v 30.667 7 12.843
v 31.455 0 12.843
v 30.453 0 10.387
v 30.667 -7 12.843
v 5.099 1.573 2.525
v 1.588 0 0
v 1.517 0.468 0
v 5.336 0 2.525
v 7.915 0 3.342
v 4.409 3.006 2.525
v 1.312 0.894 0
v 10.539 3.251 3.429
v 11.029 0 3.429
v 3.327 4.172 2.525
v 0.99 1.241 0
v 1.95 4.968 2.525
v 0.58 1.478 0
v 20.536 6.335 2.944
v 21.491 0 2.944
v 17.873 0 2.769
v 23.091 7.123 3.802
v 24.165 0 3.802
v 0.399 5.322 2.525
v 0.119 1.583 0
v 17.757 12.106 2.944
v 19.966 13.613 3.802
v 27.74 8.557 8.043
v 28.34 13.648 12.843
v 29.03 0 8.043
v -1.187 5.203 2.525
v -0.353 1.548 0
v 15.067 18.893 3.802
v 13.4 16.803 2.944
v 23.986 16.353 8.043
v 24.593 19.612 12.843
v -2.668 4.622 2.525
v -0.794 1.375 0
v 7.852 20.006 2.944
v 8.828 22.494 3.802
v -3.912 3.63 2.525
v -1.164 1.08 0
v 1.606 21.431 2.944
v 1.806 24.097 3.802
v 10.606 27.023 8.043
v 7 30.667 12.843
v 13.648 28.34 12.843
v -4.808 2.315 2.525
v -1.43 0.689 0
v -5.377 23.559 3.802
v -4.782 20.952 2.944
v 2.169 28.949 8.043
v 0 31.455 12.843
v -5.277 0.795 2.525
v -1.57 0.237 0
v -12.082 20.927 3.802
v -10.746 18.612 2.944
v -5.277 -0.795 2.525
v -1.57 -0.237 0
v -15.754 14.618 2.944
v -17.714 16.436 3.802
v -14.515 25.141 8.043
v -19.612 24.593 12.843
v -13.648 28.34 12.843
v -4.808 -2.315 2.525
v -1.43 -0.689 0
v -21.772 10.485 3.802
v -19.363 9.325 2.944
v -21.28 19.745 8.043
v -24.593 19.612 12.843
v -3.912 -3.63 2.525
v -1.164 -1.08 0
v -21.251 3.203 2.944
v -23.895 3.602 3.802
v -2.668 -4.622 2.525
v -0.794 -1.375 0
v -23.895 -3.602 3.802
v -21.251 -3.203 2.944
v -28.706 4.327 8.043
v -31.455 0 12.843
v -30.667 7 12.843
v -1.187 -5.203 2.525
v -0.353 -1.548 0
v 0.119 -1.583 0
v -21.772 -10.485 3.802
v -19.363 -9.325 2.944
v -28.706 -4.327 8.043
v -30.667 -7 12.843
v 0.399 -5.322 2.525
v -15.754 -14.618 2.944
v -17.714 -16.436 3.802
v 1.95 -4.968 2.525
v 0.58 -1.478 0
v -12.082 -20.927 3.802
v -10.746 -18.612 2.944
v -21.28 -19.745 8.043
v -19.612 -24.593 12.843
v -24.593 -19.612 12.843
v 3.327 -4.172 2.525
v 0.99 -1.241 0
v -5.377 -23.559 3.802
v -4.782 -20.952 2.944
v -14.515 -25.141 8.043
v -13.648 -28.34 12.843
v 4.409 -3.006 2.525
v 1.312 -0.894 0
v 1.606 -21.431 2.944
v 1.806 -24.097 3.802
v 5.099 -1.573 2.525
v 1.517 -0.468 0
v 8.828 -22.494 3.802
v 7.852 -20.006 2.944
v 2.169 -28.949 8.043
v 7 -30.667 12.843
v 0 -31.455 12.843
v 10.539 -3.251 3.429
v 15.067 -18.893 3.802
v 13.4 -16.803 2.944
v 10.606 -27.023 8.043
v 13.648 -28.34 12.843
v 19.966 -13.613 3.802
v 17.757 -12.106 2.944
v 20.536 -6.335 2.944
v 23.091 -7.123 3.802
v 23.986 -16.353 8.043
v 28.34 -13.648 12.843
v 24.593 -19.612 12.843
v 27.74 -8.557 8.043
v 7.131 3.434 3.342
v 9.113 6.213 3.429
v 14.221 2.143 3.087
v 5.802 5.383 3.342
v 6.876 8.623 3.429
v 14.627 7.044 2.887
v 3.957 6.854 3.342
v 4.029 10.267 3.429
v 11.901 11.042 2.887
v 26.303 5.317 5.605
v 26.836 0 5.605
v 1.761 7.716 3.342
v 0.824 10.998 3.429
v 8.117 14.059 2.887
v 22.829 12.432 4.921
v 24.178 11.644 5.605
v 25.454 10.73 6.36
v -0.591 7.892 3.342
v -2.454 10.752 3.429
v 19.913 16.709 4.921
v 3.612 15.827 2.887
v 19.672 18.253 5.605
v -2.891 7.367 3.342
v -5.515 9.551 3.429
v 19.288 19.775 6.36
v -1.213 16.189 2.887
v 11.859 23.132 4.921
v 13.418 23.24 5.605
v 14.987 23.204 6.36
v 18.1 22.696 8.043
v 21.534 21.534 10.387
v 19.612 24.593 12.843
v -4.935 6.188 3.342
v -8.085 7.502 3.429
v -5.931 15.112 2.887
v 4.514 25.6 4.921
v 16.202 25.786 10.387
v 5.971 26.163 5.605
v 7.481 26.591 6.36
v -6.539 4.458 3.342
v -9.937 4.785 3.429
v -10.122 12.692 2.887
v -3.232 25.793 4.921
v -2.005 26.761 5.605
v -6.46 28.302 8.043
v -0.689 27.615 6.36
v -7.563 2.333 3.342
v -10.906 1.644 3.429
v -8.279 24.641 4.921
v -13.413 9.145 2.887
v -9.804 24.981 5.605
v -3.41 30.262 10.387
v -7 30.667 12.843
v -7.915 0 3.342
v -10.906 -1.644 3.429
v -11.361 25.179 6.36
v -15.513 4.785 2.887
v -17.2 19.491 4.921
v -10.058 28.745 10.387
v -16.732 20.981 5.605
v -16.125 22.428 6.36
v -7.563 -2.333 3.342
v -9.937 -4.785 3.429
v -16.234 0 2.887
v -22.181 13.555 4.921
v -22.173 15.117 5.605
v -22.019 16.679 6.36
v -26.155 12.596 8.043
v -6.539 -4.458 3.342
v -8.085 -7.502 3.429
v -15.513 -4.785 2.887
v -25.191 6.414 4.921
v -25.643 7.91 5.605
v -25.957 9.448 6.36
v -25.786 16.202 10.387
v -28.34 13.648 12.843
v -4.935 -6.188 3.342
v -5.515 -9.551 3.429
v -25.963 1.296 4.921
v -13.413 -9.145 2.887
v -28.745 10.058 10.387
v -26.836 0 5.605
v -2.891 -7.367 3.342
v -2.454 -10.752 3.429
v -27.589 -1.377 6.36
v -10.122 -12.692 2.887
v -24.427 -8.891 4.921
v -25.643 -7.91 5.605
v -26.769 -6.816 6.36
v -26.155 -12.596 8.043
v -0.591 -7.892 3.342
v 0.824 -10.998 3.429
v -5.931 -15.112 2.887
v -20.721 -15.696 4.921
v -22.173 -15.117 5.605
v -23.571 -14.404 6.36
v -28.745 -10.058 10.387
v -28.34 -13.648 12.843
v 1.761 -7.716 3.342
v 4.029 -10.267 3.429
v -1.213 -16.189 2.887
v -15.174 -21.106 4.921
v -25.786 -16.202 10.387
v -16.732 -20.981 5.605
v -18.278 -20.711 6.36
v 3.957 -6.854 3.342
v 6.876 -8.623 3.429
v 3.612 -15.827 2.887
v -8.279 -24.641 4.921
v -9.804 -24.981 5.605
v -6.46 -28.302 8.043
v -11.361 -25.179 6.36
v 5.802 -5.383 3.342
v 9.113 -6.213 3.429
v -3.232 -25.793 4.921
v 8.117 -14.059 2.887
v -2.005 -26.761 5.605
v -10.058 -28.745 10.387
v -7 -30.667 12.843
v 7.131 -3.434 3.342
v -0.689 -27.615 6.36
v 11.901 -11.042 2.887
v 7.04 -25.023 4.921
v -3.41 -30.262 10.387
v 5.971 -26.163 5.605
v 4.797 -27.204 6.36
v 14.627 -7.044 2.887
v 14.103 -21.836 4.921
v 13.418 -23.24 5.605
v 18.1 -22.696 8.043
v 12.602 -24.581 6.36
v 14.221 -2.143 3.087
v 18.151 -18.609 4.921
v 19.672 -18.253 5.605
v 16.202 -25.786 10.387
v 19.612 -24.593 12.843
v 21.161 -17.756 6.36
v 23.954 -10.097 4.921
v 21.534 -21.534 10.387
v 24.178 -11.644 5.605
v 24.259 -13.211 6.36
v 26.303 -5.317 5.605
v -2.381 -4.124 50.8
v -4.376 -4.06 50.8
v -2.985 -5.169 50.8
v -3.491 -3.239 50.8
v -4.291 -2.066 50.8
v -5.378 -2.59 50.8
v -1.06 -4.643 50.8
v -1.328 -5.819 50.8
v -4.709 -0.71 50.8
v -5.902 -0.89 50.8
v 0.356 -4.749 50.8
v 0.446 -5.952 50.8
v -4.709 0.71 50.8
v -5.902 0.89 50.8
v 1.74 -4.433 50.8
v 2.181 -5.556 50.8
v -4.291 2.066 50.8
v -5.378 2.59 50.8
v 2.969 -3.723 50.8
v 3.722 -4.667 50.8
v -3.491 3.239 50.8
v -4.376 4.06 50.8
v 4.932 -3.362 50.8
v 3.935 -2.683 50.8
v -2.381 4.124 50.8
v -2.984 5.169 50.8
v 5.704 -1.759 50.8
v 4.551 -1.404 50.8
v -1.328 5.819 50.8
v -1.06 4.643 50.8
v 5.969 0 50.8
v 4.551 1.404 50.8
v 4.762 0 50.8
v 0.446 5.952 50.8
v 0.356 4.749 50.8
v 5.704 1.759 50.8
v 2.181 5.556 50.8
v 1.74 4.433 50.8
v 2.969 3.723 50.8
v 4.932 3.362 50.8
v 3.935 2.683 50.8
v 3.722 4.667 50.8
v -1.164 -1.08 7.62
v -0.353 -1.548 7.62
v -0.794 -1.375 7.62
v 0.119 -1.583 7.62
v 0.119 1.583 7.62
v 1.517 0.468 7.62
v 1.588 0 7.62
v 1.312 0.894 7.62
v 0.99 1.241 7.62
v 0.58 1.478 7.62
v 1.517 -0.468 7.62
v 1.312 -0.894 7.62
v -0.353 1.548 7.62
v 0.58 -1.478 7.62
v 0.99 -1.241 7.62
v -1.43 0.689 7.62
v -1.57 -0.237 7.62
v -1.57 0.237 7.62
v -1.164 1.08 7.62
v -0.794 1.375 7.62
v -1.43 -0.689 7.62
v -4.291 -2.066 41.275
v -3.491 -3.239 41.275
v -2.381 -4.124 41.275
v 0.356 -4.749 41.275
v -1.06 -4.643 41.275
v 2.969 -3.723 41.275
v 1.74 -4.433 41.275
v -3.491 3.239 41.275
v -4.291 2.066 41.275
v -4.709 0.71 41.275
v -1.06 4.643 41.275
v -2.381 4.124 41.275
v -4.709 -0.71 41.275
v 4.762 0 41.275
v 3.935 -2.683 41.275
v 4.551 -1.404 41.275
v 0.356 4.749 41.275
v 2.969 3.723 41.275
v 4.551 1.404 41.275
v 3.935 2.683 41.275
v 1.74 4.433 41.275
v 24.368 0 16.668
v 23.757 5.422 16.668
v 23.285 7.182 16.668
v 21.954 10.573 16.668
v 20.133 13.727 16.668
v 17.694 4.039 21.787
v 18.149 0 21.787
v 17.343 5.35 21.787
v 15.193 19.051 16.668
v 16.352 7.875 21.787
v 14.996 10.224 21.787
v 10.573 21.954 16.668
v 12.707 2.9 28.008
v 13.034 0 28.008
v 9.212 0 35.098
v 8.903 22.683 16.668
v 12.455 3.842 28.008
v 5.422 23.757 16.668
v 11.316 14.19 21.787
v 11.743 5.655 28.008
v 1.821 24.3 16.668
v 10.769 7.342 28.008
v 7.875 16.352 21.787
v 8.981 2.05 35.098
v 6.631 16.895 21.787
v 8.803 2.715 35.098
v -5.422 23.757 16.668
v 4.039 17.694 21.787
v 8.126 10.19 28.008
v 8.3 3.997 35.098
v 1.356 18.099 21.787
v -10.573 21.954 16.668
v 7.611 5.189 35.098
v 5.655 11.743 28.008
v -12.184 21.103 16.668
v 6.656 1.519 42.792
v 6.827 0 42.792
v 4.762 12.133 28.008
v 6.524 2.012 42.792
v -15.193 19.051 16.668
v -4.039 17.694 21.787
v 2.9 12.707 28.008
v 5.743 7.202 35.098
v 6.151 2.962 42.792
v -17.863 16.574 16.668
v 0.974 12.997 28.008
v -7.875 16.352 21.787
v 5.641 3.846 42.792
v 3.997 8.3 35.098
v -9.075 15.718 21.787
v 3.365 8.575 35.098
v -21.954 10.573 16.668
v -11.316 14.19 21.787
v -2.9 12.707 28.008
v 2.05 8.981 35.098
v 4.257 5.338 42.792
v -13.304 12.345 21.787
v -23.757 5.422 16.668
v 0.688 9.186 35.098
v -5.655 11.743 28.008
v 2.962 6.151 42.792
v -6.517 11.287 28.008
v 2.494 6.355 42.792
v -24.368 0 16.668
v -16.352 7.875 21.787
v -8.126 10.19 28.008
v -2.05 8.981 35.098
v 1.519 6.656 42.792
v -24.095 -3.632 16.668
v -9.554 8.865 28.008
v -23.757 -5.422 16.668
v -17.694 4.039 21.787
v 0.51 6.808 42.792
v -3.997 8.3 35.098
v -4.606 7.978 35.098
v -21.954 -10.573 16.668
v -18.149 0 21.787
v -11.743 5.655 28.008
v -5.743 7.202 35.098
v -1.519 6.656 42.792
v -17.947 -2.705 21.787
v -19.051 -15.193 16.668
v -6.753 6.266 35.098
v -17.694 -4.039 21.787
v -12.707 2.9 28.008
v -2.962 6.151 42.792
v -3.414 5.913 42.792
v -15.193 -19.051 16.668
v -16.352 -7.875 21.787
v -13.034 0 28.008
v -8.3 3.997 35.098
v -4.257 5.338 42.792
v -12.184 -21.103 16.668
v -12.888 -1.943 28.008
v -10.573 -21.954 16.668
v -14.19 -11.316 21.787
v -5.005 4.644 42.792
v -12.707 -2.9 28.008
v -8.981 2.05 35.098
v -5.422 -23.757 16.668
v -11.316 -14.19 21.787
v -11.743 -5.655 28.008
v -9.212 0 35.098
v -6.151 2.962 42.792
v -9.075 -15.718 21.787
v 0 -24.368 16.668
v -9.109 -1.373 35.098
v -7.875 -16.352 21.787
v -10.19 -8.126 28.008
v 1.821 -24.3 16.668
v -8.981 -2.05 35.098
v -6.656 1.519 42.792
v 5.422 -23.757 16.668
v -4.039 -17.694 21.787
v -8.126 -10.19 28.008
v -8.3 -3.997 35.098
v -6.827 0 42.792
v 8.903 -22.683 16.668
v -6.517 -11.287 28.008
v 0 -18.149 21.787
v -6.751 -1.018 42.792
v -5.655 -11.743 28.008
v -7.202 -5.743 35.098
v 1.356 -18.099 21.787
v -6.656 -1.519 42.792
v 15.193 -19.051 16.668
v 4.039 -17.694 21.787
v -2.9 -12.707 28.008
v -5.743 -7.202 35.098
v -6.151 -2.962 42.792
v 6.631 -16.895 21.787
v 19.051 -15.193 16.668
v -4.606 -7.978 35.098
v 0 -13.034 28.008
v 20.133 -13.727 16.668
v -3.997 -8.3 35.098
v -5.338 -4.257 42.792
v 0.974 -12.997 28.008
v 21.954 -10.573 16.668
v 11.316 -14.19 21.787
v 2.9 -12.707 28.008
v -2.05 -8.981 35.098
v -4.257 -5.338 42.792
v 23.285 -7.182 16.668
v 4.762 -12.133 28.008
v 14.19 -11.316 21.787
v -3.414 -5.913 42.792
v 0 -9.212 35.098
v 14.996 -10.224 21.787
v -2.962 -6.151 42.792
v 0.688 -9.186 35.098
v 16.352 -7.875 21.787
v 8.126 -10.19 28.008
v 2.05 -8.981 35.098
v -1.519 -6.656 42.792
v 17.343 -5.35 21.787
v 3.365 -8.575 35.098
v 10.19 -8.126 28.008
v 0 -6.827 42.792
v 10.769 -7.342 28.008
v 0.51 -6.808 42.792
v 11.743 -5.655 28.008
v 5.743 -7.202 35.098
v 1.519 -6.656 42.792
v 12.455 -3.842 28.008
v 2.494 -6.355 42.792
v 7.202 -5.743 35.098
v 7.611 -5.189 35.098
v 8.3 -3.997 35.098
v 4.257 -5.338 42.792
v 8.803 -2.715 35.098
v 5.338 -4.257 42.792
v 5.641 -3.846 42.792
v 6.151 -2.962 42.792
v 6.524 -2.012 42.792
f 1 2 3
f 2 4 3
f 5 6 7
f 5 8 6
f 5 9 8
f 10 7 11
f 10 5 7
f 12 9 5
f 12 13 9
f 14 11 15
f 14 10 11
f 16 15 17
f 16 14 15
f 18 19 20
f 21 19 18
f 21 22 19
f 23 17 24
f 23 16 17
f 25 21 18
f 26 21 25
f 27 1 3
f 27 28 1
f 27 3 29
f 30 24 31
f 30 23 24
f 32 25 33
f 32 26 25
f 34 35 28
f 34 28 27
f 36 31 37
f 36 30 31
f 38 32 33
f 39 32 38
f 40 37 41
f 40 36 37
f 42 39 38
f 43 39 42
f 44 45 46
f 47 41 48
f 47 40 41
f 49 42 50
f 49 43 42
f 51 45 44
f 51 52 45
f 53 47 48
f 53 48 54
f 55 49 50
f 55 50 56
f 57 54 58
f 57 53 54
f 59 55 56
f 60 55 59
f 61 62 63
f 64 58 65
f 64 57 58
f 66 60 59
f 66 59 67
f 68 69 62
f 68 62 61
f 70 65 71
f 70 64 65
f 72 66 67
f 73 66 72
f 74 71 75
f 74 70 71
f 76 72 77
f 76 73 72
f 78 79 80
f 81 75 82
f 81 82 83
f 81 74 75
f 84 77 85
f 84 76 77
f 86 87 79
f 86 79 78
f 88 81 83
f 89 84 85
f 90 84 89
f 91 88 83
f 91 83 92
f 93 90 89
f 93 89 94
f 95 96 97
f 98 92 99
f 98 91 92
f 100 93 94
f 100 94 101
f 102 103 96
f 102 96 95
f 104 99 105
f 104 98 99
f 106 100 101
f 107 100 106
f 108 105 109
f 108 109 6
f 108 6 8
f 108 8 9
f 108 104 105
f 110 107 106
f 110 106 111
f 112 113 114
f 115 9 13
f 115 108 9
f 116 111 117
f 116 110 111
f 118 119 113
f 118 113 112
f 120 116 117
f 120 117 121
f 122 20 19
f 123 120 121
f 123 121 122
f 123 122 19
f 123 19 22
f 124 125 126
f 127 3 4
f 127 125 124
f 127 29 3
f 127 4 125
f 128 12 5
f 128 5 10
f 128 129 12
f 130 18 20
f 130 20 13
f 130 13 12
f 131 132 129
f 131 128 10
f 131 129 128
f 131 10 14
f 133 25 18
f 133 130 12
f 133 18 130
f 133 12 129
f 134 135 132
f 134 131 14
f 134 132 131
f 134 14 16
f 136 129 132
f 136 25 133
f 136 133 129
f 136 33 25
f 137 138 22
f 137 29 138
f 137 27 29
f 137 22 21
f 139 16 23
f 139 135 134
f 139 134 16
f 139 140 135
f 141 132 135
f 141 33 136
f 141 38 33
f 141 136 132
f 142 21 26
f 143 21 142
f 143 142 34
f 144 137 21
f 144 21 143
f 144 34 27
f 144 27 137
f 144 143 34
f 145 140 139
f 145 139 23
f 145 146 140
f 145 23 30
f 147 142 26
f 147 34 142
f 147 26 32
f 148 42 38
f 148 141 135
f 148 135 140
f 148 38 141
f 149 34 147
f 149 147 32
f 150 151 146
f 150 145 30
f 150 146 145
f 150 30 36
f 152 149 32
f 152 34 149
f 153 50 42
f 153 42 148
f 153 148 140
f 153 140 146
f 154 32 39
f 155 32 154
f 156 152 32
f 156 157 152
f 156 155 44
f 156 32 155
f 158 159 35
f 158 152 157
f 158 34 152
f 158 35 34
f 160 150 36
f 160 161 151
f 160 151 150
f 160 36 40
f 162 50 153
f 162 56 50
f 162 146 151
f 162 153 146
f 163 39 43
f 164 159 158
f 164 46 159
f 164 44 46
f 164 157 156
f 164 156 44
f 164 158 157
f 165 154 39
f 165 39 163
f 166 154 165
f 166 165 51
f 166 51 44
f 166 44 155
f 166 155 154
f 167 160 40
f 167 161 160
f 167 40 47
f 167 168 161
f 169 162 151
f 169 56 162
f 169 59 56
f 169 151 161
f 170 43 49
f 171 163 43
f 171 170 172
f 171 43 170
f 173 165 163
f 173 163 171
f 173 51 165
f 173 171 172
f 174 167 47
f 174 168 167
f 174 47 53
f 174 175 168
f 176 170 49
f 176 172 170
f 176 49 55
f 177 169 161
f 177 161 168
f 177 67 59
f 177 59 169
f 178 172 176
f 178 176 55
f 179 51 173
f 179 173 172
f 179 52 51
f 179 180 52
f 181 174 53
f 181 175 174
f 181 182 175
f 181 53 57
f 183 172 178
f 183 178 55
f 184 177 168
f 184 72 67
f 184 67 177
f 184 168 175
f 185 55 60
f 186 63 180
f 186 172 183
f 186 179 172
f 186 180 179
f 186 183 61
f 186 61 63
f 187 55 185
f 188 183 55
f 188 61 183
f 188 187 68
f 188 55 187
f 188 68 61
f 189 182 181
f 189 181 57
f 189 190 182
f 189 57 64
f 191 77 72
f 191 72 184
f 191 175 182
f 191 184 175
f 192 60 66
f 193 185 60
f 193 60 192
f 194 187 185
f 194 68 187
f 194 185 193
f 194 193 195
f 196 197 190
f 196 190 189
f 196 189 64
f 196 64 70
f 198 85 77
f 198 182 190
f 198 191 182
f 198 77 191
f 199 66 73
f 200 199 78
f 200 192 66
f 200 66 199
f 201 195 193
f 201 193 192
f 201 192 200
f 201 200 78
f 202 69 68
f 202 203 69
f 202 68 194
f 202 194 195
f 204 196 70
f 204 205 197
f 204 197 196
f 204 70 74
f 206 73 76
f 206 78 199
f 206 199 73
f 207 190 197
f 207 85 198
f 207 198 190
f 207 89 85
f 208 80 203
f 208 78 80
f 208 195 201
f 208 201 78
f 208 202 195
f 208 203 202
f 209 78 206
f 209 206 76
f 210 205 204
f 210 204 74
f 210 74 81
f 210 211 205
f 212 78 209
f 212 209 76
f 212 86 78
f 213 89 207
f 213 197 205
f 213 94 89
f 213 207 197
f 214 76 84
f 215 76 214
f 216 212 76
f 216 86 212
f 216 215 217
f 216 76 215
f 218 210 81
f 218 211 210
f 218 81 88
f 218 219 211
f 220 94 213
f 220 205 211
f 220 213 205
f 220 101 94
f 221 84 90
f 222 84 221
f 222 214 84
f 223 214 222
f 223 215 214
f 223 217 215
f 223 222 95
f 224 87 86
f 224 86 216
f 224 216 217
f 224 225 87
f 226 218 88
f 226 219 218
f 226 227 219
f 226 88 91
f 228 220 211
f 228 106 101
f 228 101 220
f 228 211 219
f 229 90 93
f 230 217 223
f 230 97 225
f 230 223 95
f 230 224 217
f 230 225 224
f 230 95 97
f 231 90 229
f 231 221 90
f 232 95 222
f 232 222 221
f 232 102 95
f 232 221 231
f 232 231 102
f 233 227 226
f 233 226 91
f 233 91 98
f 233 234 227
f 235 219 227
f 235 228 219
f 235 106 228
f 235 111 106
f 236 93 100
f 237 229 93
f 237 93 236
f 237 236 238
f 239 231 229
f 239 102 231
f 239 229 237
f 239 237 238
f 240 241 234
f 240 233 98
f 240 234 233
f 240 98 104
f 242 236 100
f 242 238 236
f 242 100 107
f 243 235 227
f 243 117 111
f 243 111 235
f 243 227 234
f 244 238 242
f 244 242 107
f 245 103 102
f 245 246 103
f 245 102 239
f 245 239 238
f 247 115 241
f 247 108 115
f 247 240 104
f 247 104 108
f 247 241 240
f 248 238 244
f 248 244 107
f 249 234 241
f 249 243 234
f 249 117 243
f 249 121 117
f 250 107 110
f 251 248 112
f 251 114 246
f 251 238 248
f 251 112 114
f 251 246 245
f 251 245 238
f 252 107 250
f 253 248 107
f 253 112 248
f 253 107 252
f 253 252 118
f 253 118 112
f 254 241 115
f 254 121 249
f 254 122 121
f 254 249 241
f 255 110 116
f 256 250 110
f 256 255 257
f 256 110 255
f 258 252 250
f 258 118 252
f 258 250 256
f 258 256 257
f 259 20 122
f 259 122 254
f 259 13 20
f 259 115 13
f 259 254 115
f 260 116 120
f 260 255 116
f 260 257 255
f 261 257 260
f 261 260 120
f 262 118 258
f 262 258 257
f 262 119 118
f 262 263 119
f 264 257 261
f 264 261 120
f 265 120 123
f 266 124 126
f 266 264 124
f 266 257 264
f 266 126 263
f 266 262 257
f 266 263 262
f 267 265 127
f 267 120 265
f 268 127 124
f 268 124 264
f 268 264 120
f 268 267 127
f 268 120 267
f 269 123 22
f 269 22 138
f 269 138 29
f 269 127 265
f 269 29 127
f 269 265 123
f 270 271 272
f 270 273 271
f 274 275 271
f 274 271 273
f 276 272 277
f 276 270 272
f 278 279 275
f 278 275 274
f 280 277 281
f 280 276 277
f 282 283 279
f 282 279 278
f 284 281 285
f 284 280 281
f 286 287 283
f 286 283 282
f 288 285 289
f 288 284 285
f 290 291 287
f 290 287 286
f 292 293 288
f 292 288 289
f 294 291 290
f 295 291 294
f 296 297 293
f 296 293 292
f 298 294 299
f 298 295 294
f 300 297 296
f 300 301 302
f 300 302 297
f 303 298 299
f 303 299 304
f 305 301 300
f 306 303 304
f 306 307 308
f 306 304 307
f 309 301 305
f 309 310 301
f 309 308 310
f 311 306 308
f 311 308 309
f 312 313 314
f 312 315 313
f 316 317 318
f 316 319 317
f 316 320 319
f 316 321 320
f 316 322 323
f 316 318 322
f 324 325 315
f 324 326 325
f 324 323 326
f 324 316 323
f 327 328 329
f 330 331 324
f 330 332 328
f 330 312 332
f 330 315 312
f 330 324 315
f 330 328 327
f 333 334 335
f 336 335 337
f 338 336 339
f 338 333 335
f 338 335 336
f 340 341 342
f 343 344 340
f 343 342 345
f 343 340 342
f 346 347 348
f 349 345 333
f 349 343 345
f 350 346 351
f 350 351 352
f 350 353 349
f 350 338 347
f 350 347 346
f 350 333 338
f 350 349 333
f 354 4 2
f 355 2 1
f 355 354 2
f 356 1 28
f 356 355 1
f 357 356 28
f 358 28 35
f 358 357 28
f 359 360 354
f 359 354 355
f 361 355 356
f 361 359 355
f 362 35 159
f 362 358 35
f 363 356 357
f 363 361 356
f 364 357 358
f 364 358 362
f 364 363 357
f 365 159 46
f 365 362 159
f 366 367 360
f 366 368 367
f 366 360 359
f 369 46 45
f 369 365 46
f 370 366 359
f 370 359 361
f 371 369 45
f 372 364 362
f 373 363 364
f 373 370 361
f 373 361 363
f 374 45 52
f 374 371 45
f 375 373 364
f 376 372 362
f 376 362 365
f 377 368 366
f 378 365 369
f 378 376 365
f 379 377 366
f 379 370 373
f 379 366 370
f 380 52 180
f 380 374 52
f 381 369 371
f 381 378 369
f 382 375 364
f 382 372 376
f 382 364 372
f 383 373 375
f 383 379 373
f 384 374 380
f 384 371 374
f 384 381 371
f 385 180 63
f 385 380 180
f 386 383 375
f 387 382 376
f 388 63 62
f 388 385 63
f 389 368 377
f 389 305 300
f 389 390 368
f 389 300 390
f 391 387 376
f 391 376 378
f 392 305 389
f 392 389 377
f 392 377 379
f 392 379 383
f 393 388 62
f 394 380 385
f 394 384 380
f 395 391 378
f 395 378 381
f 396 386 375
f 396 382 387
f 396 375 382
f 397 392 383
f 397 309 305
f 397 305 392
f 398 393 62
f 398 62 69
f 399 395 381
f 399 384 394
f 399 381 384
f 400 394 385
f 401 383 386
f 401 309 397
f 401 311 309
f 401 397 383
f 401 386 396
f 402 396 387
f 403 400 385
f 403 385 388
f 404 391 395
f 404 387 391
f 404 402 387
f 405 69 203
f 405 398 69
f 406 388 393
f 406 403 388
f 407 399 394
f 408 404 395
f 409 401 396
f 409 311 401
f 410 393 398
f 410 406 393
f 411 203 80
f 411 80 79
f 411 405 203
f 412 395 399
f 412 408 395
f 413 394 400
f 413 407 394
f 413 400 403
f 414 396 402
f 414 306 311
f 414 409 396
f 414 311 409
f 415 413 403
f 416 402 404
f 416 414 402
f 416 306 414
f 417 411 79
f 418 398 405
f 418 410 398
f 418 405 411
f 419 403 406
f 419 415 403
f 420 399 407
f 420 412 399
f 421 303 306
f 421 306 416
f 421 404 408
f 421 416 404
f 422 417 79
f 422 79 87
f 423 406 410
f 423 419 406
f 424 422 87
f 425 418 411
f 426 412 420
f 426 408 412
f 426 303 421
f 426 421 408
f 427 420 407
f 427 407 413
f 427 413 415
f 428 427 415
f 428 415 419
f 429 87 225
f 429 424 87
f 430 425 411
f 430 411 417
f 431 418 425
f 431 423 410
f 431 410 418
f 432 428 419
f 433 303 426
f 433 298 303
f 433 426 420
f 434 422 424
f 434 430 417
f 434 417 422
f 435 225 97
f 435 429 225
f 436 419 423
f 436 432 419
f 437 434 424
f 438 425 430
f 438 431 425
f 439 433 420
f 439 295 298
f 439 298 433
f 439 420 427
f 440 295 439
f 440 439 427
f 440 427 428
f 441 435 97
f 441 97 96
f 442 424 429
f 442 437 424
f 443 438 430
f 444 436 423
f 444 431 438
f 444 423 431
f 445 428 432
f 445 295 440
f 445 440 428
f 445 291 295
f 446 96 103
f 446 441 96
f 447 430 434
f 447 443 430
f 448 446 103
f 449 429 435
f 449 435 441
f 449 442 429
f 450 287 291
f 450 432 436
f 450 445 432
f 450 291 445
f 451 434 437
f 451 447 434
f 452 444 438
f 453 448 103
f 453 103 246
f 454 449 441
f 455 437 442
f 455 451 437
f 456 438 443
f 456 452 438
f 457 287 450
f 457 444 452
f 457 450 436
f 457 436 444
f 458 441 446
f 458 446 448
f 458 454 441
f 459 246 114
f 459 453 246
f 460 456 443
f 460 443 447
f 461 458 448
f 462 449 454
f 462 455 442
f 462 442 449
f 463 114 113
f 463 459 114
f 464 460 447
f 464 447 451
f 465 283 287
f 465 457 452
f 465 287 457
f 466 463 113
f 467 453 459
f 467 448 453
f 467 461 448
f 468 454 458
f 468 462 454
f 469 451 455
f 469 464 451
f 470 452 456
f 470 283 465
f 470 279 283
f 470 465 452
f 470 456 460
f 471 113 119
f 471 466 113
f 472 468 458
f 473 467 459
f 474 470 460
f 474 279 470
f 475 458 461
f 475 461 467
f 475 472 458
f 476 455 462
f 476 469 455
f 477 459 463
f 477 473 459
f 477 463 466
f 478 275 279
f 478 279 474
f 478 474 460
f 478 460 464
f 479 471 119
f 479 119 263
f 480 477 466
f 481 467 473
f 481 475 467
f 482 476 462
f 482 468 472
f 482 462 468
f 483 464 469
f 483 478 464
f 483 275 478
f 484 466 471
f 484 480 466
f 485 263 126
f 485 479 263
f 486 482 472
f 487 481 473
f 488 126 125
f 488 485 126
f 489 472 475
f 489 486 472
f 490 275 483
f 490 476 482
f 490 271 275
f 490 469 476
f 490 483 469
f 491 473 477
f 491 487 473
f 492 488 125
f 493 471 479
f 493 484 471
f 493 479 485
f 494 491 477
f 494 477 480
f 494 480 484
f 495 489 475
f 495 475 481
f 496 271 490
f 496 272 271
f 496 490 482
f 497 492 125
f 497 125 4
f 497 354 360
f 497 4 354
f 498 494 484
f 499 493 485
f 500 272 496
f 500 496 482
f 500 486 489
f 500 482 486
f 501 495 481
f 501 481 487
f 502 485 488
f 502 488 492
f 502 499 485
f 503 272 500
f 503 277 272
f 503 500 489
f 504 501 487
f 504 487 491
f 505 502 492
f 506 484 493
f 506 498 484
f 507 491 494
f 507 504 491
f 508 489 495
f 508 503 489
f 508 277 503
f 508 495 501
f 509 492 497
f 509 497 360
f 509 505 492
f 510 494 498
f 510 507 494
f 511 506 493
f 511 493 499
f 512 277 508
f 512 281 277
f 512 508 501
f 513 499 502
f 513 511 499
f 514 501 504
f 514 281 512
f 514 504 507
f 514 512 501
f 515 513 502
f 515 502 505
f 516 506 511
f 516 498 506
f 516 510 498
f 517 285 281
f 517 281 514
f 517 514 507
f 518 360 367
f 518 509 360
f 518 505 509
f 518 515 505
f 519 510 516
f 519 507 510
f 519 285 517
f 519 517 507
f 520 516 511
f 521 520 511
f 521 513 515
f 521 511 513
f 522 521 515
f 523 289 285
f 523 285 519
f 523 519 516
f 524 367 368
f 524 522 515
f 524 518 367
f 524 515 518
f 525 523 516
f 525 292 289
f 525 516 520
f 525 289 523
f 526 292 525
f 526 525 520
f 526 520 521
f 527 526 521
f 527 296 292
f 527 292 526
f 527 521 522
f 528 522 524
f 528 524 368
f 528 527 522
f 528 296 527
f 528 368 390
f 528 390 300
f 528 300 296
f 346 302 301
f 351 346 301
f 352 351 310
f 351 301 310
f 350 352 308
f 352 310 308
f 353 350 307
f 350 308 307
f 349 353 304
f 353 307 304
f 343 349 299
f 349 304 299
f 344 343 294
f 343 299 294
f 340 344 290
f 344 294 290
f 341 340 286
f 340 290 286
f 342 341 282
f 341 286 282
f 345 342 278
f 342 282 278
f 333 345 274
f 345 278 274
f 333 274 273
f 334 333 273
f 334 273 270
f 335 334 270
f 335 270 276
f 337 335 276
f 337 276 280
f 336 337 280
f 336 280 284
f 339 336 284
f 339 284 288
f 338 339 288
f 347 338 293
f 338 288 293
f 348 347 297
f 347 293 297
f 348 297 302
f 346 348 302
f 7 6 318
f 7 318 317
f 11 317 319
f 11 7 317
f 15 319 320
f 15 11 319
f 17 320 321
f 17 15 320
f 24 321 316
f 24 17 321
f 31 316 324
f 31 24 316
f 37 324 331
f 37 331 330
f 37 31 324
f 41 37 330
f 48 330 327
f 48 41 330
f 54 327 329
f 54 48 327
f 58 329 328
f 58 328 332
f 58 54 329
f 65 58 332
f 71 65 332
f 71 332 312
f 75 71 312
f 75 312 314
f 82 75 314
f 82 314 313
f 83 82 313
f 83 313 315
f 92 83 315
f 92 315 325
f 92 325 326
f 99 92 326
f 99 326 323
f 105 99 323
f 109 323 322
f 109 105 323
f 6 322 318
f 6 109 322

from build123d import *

# Parameters (mm, degrees)
F2_R     = 4.7625
F3_DEPTH = 9.525
F4_DEPTH = 7.62


with BuildPart() as f1:
    # F0 (on Front) → F1 (revolve)
    with BuildSketch(Plane.XZ):
        with BuildLine():
            Line((0, 50.8), (0, 0))
            Line((0, 0), (1.5875, 0))
            add(Edge.make_bspline(
                [(1.5875, 0), (3.4055108405, 1.445712693), (8.2236413921, 5.3008235661), (23.5709920987, -0.0020492519), (30.1573484378, 8.7371555385), (31.4554715347, 12.8426796426)],
                knots=[0, 0, 0, 0, 0.271576951, 0.6434810604, 1, 1, 1, 1], degree=3))
            ThreePointArc((31.4554715347, 12.8426796426), (13.0335870575, 28.0084068393), (5.969, 50.8))
            Line((5.969, 50.8), (0, 50.8))
        make_face()
    revolve(axis=Axis((0, 0, 25.4), (0, 0, 1)))

    # F2 (on face) → F3 (cut)
    with BuildSketch(Plane.XY.offset(50.8)):
        Circle(F2_R)
    extrude(amount=-F3_DEPTH, mode=Mode.SUBTRACT)

    # F4 (cut): a face of the model
    f4_faces = [f1.faces().sort_by_distance(p)[0] for p in [
        (0, 0, 0),
    ]]
    extrude(f4_faces, amount=-F4_DEPTH, mode=Mode.SUBTRACT)


solid = f1.part
